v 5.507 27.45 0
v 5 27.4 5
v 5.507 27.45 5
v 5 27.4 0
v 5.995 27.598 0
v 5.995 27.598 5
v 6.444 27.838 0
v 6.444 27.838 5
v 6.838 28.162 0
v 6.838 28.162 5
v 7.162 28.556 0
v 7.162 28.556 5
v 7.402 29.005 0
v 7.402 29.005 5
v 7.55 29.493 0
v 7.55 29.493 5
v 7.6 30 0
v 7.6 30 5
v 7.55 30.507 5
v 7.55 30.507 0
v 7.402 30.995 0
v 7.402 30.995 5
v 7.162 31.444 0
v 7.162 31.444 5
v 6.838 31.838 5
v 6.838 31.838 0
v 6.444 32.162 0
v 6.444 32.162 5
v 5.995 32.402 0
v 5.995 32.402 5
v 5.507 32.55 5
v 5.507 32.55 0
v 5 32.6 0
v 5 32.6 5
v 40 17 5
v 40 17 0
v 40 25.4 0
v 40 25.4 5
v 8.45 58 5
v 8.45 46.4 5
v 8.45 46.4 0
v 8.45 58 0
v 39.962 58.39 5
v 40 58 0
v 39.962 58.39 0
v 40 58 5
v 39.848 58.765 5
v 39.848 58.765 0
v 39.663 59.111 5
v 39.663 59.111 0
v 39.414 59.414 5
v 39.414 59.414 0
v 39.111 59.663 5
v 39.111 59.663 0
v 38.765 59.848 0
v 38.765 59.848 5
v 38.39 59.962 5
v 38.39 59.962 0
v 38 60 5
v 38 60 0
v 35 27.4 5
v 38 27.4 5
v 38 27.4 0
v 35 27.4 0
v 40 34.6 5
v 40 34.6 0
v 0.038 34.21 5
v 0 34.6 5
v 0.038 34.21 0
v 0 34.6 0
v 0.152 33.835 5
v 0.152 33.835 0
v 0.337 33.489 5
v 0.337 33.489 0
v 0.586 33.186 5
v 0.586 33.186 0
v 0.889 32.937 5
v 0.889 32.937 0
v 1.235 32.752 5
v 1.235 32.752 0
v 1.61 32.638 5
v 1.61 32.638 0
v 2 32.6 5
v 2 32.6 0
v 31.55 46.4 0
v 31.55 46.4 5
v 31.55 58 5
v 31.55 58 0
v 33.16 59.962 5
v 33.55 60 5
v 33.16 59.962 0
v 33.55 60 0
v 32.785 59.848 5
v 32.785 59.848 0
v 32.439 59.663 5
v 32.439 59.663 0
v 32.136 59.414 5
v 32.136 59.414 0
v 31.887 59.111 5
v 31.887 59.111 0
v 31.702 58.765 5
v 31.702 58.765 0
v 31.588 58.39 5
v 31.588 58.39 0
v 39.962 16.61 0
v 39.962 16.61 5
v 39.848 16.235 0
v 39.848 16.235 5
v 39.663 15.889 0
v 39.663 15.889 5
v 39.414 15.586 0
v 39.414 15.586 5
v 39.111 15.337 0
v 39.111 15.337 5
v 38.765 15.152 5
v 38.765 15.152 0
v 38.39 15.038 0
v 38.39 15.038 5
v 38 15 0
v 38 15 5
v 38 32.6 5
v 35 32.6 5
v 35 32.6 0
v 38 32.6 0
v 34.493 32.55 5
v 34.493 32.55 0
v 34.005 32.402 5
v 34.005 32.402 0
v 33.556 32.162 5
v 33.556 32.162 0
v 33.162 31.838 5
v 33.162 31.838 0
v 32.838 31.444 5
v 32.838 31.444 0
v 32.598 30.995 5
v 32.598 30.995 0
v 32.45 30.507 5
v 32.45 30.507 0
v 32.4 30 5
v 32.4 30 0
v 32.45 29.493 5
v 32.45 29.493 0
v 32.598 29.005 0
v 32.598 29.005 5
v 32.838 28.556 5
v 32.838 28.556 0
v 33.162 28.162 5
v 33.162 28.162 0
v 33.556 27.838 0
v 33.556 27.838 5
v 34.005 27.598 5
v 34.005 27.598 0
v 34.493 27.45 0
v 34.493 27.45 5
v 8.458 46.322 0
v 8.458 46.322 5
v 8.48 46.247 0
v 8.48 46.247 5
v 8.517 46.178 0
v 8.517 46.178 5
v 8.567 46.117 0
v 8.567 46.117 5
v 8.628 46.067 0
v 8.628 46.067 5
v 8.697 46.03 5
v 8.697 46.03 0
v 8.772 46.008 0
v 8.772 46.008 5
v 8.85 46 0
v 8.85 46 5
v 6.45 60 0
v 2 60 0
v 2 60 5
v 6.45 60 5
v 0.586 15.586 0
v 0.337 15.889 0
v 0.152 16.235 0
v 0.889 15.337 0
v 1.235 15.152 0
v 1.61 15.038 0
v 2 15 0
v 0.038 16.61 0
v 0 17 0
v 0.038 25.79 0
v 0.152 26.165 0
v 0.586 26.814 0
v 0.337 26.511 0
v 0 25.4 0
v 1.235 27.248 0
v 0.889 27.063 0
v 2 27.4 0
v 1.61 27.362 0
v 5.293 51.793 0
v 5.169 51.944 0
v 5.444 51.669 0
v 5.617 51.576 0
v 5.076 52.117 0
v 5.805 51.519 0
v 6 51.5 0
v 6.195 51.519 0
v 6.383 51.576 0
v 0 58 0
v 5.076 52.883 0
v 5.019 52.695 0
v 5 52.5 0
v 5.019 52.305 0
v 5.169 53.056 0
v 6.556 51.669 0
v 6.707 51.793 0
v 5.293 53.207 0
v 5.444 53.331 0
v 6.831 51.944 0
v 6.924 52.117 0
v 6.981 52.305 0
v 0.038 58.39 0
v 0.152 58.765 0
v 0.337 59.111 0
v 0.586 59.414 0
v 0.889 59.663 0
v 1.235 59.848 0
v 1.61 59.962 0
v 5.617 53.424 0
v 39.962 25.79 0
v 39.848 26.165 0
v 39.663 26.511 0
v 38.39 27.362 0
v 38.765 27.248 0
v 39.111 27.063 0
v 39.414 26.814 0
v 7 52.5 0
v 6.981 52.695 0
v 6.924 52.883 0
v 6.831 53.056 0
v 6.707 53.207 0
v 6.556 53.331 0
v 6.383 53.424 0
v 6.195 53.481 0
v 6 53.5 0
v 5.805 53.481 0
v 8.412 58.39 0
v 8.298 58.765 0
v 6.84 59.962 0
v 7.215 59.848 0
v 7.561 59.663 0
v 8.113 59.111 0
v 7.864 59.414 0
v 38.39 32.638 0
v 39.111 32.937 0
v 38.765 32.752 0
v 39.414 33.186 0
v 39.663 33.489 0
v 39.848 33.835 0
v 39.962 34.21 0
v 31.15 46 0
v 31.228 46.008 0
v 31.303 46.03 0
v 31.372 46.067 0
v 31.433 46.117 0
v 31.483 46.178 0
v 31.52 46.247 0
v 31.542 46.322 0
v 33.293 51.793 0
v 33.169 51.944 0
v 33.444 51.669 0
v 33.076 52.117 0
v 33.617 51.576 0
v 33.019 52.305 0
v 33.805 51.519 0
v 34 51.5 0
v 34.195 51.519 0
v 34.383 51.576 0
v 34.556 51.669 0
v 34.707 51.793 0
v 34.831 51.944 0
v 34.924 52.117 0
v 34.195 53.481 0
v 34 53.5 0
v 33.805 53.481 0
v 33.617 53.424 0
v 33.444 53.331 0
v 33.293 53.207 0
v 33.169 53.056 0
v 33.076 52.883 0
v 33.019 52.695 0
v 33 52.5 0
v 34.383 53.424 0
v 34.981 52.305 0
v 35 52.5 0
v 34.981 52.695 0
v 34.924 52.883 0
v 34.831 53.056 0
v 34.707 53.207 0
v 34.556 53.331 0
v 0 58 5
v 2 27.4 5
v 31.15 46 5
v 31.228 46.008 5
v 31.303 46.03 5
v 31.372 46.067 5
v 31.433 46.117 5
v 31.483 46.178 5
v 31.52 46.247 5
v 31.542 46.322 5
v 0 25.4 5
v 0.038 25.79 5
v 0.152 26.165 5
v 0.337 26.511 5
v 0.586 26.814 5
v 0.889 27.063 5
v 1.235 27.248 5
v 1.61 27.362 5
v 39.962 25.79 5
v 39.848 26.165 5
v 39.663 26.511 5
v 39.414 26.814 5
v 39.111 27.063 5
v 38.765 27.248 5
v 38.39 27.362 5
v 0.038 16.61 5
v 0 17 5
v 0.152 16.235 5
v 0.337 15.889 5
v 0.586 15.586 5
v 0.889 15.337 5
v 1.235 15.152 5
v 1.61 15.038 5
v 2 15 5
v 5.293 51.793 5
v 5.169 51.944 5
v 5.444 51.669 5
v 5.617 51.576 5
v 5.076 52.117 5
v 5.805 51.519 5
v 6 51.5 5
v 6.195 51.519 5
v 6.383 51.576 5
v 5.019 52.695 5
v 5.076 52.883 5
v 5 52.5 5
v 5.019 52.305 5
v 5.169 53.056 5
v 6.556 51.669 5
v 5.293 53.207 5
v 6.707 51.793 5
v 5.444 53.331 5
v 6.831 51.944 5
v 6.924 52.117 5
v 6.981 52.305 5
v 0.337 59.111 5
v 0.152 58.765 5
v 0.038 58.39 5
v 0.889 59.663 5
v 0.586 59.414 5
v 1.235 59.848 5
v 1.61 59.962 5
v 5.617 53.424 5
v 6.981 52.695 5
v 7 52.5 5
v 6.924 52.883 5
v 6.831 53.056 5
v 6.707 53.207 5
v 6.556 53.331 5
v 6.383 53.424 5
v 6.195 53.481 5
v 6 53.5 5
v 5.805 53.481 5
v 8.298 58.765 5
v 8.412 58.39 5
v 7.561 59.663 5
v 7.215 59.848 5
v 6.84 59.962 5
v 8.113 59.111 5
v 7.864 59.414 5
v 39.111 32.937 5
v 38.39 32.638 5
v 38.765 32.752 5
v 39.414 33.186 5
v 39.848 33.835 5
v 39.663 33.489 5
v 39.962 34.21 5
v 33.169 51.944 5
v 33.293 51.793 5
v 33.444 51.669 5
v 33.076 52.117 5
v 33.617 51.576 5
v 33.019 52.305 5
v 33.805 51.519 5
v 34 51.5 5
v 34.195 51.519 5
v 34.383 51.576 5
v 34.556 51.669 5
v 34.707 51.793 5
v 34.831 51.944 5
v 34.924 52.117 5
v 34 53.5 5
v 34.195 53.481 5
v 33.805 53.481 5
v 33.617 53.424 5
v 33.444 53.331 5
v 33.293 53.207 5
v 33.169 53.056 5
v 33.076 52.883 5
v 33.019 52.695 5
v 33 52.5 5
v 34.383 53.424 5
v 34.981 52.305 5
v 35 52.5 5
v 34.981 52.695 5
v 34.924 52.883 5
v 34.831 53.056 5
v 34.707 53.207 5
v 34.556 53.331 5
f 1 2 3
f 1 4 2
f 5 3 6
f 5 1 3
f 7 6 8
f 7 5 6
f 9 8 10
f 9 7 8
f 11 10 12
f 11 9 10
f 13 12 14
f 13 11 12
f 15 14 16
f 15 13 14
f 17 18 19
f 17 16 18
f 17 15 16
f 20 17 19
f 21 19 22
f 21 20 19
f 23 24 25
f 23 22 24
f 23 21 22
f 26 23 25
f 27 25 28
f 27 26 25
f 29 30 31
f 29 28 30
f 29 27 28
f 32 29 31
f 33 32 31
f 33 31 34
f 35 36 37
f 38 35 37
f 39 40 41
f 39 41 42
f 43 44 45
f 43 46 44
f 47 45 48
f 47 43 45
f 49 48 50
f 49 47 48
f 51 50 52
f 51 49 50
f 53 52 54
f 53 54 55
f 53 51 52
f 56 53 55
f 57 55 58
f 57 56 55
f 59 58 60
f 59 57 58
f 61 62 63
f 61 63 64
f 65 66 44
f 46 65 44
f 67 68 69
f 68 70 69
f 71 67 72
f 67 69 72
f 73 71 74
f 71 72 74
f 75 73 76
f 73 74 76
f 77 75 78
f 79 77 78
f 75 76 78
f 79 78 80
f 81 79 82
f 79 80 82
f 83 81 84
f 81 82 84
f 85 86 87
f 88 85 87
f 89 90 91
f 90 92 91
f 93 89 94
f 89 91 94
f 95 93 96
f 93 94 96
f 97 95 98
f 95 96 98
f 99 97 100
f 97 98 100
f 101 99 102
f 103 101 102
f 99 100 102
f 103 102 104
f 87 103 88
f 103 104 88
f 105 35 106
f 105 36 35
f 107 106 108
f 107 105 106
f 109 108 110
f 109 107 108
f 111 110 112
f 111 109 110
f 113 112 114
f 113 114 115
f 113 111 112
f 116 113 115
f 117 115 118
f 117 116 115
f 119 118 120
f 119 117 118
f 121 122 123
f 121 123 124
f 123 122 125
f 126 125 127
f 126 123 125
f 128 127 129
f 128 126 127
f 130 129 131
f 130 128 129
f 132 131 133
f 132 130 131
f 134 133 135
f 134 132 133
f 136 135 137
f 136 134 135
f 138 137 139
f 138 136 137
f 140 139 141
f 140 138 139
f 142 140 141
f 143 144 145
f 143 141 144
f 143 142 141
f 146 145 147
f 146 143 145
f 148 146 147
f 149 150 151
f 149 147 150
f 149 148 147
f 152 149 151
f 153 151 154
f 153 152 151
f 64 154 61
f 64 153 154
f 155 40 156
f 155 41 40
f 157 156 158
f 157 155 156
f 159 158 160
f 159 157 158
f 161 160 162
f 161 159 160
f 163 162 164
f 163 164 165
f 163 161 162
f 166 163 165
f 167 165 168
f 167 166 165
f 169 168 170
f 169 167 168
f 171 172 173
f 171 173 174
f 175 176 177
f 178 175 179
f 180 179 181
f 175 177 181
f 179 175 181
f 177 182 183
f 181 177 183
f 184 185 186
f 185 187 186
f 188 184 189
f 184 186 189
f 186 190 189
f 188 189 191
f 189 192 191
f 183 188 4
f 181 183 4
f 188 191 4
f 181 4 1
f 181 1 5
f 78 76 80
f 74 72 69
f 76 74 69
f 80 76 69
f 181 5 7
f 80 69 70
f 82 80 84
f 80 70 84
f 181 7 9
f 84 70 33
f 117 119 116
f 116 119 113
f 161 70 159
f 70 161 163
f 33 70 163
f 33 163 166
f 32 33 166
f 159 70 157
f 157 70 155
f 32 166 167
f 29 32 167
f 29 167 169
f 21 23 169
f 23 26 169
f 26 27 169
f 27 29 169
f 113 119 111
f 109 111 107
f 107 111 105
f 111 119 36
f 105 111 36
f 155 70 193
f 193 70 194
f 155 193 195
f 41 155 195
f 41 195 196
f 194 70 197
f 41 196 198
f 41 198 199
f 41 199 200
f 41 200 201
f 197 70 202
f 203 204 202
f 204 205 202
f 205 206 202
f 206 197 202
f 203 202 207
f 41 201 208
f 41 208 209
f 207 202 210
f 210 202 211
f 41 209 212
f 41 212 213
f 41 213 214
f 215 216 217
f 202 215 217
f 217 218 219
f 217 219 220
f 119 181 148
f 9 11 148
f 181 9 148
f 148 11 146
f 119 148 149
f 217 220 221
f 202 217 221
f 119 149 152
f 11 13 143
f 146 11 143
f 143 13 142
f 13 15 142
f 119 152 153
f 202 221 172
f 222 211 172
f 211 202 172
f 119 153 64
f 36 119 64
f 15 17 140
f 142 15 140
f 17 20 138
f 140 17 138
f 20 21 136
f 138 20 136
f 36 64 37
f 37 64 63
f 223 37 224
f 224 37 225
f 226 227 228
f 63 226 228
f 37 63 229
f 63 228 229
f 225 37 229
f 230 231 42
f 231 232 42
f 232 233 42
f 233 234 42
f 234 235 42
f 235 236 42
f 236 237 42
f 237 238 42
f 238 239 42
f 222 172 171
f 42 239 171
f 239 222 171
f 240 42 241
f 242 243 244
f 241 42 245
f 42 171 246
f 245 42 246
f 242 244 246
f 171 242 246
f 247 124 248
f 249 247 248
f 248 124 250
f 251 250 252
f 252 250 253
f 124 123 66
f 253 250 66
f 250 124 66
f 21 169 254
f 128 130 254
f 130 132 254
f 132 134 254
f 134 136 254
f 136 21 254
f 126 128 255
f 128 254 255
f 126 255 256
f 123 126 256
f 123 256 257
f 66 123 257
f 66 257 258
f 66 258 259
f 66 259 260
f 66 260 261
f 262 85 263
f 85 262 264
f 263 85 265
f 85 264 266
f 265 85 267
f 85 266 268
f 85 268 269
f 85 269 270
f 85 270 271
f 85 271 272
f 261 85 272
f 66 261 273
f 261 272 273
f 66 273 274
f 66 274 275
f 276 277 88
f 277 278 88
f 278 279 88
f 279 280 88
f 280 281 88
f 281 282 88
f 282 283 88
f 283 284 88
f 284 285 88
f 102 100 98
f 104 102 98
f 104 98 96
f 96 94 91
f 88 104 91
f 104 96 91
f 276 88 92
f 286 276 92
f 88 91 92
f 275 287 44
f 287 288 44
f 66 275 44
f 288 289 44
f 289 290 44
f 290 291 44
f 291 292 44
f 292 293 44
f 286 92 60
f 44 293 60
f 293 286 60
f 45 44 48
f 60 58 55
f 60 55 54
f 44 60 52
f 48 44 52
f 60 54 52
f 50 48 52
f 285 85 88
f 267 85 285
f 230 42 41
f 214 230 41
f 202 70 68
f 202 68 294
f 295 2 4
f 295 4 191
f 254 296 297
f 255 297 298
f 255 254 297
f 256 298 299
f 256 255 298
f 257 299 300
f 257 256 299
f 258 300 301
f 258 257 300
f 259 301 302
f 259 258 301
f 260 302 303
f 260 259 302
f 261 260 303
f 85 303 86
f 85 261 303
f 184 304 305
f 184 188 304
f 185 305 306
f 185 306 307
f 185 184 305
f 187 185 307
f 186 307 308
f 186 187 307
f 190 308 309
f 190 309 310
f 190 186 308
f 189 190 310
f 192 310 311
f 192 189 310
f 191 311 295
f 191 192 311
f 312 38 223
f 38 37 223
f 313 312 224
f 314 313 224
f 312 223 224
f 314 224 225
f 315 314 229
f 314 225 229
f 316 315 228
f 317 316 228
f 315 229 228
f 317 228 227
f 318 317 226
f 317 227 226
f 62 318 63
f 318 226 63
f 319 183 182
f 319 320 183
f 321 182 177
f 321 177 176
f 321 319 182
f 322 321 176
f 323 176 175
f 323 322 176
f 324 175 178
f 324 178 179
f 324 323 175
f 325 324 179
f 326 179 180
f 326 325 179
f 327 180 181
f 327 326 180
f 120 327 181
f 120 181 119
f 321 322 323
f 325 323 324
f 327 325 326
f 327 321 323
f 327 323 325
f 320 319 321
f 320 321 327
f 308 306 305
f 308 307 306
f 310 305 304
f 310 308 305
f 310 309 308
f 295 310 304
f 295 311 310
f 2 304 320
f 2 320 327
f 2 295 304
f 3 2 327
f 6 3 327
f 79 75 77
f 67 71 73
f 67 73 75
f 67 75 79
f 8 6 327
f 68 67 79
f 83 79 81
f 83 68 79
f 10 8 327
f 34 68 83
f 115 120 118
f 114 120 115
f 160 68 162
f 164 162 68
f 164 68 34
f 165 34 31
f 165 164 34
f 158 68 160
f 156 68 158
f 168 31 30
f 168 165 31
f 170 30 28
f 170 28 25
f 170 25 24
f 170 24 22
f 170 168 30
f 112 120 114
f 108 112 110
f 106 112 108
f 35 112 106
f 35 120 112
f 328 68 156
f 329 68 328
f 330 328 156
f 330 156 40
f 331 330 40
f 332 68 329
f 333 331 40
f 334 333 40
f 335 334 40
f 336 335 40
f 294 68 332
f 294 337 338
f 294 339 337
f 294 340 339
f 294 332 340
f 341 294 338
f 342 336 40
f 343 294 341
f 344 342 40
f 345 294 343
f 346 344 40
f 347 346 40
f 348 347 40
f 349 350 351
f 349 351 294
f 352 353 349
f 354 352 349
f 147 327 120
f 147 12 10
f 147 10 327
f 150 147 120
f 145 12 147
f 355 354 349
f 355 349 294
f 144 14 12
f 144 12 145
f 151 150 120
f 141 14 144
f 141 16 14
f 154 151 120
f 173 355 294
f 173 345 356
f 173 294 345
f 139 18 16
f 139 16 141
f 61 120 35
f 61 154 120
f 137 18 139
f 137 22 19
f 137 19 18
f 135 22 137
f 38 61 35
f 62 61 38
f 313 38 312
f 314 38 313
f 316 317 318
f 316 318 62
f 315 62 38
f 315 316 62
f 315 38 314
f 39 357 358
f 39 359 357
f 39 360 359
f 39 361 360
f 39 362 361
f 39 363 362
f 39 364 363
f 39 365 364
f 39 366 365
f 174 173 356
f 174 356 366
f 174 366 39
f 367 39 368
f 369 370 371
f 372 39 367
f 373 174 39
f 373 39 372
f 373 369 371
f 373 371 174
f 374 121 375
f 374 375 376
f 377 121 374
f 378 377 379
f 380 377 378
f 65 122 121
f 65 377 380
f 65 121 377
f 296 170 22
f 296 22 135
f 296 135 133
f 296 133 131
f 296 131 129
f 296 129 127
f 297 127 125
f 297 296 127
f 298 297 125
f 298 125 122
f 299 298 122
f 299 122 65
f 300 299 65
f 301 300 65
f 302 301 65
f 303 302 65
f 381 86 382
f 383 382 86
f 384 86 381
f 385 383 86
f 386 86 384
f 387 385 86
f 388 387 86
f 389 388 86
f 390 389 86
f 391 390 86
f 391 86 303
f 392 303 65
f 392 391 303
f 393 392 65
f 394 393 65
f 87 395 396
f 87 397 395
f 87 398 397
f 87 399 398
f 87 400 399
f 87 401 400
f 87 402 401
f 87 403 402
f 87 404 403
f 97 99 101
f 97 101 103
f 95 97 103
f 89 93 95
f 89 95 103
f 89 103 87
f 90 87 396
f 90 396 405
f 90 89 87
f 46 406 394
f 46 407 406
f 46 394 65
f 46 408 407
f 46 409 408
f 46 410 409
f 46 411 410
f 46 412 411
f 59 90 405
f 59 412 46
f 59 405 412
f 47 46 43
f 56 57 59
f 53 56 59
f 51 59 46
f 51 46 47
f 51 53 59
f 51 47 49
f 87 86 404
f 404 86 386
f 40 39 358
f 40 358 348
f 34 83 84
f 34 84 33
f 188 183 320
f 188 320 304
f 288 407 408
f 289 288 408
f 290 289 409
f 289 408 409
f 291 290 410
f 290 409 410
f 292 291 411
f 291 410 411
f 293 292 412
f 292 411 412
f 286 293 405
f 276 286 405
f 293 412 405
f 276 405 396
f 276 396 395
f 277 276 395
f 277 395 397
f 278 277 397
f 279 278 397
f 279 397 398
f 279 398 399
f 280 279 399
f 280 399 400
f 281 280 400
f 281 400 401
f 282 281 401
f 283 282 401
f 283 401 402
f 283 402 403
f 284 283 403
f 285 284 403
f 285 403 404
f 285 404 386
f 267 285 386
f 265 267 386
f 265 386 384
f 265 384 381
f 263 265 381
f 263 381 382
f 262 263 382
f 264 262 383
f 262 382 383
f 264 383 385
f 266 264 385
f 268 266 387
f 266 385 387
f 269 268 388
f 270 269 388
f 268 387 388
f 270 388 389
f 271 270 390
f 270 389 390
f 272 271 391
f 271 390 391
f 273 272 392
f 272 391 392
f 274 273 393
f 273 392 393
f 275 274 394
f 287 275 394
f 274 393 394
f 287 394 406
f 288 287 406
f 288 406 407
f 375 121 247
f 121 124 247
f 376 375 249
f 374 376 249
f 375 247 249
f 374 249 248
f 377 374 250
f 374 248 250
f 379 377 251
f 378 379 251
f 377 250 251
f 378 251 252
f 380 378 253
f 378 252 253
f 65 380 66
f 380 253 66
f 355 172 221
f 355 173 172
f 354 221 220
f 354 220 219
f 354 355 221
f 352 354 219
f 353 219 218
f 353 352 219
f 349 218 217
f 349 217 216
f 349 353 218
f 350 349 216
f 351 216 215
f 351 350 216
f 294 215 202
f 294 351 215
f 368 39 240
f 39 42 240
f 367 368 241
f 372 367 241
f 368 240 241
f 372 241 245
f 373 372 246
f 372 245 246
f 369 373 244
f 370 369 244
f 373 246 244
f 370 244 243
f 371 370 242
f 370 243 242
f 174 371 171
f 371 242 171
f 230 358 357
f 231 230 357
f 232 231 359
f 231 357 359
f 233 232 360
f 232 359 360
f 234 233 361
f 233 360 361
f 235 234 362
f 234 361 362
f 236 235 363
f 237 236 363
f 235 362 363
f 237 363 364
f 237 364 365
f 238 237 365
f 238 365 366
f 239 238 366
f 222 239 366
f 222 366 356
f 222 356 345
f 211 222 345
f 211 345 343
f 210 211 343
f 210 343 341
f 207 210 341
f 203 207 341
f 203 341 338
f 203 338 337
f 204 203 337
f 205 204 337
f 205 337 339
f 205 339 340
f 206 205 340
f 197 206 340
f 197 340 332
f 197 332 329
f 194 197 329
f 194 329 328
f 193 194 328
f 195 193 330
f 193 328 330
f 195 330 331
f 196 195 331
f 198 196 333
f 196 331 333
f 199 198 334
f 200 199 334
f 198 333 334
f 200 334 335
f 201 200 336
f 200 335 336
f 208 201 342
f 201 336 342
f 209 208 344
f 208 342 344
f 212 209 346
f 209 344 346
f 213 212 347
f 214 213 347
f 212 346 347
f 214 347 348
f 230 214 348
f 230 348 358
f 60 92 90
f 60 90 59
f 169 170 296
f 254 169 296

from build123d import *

# Parameters (mm, degrees)
ESQUISSE1_W             = 40
ESQUISSE1_H             = 60
ESQUISSE1_R             = 2.6
BOSS_EXTRU_1_DEPTH      = 5
ESQUISSE2_W             = 23.1
ESQUISSE2_H             = 14
ENL_V_MAT_EXTRU_1_DEPTH = 73.284161474
CONG_1_R                = 2
CONG_2_R                = 0.4
ESQUISSE3_R             = 1
ENL_V_MAT_EXTRU_2_DEPTH = 73.284161474
ESQUISSE4_W             = 48.028106485
ESQUISSE4_H             = 39.571936154
ENL_V_MAT_EXTRU_3_DEPTH = 10
CONG_3_R                = 2


with BuildPart() as part:
    # Esquisse1 → Boss.-Extru.1 (new body)
    with BuildSketch(Plane.XY):
        with Locations((20, 30)):
            Rectangle(ESQUISSE1_W, ESQUISSE1_H)
        with Locations((5, 30)):
            Circle(ESQUISSE1_R, mode=Mode.SUBTRACT)
        with Locations((35, 30)):
            Circle(ESQUISSE1_R, mode=Mode.SUBTRACT)
    extrude(amount=BOSS_EXTRU_1_DEPTH)

    # Esquisse2 → Enlèv. mat.-Extru.1 (cut, through all)
    with BuildSketch(Plane.XY.offset(5)):
        with BuildLine():
            Line((5, 27.4), (0, 27.4))
            ThreePointArc((0, 27.4), (-2.6, 30), (0, 32.6))
            Line((0, 32.6), (5, 32.6))
            ThreePointArc((5, 32.6), (7.6, 30), (5, 27.4))
        make_face()
        with BuildLine():
            Line((35, 32.6), (40, 32.6))
            ThreePointArc((40, 32.6), (42.6, 30), (40, 27.4))
            Line((40, 27.4), (35, 27.4))
            ThreePointArc((35, 27.4), (32.4, 30), (35, 32.6))
        make_face()
        with Locations((20, 53)):
            Rectangle(ESQUISSE2_W, ESQUISSE2_H)
        with Locations((20, 7)):
            Rectangle(ESQUISSE2_W, ESQUISSE2_H)
    extrude(amount=-ENL_V_MAT_EXTRU_1_DEPTH, mode=Mode.SUBTRACT)

    # Congé1
    cong_1_edges = [part.edges().sort_by_distance(p)[0] for p in [
        (0, 27.4, 2.5),
        (0, 32.6, 2.5),
        (40, 32.6, 2.5),
        (40, 27.4, 2.5),
        (8.45, 60, 2.5),
        (31.55, 60, 2.5),
        (8.45, 0, 2.5),
        (31.55, 0, 2.5),
        (0, 60, 2.5),
        (40, 60, 2.5),
        (40, 0, 2.5),
        (0, 0, 2.5),
    ]]
    fillet(cong_1_edges, radius=CONG_1_R)

    # Congé2
    cong_2_edges = [part.edges().sort_by_distance(p)[0] for p in [
        (8.45, 46, 2.5),
        (31.55, 46, 2.5),
        (8.45, 14, 2.5),
        (31.55, 14, 2.5),
    ]]
    fillet(cong_2_edges, radius=CONG_2_R)

    # Esquisse3 → Enlèv. mat.-Extru.2 (cut, through all)
    with BuildSketch(Plane.XY.offset(5)):
        with Locations((34, 52.5)):
            Circle(ESQUISSE3_R)
        with Locations((6, 52.5)):
            Circle(ESQUISSE3_R)
        with Locations(Location((6, 7.5, 0), (0, 0, 180))):
            Circle(ESQUISSE3_R)
        with Locations(Location((34, 7.5, 0), (0, 0, 180))):
            Circle(ESQUISSE3_R)
    extrude(amount=-ENL_V_MAT_EXTRU_2_DEPTH, mode=Mode.SUBTRACT)

    # Esquisse4 → Enlèv. mat.-Extru.3 (cut)
    with BuildSketch(Plane.XY.offset(5)):
        with Locations((15.985946757, -4.785968077)):
            Rectangle(ESQUISSE4_W, ESQUISSE4_H)
    extrude(amount=-ENL_V_MAT_EXTRU_3_DEPTH, mode=Mode.SUBTRACT)

    # Congé3
    cong_3_edges = [part.edges().sort_by_distance(p)[0] for p in [
        (0, 15, 2.5),
        (40, 15, 2.5),
    ]]
    fillet(cong_3_edges, radius=CONG_3_R)


solid = part.part
